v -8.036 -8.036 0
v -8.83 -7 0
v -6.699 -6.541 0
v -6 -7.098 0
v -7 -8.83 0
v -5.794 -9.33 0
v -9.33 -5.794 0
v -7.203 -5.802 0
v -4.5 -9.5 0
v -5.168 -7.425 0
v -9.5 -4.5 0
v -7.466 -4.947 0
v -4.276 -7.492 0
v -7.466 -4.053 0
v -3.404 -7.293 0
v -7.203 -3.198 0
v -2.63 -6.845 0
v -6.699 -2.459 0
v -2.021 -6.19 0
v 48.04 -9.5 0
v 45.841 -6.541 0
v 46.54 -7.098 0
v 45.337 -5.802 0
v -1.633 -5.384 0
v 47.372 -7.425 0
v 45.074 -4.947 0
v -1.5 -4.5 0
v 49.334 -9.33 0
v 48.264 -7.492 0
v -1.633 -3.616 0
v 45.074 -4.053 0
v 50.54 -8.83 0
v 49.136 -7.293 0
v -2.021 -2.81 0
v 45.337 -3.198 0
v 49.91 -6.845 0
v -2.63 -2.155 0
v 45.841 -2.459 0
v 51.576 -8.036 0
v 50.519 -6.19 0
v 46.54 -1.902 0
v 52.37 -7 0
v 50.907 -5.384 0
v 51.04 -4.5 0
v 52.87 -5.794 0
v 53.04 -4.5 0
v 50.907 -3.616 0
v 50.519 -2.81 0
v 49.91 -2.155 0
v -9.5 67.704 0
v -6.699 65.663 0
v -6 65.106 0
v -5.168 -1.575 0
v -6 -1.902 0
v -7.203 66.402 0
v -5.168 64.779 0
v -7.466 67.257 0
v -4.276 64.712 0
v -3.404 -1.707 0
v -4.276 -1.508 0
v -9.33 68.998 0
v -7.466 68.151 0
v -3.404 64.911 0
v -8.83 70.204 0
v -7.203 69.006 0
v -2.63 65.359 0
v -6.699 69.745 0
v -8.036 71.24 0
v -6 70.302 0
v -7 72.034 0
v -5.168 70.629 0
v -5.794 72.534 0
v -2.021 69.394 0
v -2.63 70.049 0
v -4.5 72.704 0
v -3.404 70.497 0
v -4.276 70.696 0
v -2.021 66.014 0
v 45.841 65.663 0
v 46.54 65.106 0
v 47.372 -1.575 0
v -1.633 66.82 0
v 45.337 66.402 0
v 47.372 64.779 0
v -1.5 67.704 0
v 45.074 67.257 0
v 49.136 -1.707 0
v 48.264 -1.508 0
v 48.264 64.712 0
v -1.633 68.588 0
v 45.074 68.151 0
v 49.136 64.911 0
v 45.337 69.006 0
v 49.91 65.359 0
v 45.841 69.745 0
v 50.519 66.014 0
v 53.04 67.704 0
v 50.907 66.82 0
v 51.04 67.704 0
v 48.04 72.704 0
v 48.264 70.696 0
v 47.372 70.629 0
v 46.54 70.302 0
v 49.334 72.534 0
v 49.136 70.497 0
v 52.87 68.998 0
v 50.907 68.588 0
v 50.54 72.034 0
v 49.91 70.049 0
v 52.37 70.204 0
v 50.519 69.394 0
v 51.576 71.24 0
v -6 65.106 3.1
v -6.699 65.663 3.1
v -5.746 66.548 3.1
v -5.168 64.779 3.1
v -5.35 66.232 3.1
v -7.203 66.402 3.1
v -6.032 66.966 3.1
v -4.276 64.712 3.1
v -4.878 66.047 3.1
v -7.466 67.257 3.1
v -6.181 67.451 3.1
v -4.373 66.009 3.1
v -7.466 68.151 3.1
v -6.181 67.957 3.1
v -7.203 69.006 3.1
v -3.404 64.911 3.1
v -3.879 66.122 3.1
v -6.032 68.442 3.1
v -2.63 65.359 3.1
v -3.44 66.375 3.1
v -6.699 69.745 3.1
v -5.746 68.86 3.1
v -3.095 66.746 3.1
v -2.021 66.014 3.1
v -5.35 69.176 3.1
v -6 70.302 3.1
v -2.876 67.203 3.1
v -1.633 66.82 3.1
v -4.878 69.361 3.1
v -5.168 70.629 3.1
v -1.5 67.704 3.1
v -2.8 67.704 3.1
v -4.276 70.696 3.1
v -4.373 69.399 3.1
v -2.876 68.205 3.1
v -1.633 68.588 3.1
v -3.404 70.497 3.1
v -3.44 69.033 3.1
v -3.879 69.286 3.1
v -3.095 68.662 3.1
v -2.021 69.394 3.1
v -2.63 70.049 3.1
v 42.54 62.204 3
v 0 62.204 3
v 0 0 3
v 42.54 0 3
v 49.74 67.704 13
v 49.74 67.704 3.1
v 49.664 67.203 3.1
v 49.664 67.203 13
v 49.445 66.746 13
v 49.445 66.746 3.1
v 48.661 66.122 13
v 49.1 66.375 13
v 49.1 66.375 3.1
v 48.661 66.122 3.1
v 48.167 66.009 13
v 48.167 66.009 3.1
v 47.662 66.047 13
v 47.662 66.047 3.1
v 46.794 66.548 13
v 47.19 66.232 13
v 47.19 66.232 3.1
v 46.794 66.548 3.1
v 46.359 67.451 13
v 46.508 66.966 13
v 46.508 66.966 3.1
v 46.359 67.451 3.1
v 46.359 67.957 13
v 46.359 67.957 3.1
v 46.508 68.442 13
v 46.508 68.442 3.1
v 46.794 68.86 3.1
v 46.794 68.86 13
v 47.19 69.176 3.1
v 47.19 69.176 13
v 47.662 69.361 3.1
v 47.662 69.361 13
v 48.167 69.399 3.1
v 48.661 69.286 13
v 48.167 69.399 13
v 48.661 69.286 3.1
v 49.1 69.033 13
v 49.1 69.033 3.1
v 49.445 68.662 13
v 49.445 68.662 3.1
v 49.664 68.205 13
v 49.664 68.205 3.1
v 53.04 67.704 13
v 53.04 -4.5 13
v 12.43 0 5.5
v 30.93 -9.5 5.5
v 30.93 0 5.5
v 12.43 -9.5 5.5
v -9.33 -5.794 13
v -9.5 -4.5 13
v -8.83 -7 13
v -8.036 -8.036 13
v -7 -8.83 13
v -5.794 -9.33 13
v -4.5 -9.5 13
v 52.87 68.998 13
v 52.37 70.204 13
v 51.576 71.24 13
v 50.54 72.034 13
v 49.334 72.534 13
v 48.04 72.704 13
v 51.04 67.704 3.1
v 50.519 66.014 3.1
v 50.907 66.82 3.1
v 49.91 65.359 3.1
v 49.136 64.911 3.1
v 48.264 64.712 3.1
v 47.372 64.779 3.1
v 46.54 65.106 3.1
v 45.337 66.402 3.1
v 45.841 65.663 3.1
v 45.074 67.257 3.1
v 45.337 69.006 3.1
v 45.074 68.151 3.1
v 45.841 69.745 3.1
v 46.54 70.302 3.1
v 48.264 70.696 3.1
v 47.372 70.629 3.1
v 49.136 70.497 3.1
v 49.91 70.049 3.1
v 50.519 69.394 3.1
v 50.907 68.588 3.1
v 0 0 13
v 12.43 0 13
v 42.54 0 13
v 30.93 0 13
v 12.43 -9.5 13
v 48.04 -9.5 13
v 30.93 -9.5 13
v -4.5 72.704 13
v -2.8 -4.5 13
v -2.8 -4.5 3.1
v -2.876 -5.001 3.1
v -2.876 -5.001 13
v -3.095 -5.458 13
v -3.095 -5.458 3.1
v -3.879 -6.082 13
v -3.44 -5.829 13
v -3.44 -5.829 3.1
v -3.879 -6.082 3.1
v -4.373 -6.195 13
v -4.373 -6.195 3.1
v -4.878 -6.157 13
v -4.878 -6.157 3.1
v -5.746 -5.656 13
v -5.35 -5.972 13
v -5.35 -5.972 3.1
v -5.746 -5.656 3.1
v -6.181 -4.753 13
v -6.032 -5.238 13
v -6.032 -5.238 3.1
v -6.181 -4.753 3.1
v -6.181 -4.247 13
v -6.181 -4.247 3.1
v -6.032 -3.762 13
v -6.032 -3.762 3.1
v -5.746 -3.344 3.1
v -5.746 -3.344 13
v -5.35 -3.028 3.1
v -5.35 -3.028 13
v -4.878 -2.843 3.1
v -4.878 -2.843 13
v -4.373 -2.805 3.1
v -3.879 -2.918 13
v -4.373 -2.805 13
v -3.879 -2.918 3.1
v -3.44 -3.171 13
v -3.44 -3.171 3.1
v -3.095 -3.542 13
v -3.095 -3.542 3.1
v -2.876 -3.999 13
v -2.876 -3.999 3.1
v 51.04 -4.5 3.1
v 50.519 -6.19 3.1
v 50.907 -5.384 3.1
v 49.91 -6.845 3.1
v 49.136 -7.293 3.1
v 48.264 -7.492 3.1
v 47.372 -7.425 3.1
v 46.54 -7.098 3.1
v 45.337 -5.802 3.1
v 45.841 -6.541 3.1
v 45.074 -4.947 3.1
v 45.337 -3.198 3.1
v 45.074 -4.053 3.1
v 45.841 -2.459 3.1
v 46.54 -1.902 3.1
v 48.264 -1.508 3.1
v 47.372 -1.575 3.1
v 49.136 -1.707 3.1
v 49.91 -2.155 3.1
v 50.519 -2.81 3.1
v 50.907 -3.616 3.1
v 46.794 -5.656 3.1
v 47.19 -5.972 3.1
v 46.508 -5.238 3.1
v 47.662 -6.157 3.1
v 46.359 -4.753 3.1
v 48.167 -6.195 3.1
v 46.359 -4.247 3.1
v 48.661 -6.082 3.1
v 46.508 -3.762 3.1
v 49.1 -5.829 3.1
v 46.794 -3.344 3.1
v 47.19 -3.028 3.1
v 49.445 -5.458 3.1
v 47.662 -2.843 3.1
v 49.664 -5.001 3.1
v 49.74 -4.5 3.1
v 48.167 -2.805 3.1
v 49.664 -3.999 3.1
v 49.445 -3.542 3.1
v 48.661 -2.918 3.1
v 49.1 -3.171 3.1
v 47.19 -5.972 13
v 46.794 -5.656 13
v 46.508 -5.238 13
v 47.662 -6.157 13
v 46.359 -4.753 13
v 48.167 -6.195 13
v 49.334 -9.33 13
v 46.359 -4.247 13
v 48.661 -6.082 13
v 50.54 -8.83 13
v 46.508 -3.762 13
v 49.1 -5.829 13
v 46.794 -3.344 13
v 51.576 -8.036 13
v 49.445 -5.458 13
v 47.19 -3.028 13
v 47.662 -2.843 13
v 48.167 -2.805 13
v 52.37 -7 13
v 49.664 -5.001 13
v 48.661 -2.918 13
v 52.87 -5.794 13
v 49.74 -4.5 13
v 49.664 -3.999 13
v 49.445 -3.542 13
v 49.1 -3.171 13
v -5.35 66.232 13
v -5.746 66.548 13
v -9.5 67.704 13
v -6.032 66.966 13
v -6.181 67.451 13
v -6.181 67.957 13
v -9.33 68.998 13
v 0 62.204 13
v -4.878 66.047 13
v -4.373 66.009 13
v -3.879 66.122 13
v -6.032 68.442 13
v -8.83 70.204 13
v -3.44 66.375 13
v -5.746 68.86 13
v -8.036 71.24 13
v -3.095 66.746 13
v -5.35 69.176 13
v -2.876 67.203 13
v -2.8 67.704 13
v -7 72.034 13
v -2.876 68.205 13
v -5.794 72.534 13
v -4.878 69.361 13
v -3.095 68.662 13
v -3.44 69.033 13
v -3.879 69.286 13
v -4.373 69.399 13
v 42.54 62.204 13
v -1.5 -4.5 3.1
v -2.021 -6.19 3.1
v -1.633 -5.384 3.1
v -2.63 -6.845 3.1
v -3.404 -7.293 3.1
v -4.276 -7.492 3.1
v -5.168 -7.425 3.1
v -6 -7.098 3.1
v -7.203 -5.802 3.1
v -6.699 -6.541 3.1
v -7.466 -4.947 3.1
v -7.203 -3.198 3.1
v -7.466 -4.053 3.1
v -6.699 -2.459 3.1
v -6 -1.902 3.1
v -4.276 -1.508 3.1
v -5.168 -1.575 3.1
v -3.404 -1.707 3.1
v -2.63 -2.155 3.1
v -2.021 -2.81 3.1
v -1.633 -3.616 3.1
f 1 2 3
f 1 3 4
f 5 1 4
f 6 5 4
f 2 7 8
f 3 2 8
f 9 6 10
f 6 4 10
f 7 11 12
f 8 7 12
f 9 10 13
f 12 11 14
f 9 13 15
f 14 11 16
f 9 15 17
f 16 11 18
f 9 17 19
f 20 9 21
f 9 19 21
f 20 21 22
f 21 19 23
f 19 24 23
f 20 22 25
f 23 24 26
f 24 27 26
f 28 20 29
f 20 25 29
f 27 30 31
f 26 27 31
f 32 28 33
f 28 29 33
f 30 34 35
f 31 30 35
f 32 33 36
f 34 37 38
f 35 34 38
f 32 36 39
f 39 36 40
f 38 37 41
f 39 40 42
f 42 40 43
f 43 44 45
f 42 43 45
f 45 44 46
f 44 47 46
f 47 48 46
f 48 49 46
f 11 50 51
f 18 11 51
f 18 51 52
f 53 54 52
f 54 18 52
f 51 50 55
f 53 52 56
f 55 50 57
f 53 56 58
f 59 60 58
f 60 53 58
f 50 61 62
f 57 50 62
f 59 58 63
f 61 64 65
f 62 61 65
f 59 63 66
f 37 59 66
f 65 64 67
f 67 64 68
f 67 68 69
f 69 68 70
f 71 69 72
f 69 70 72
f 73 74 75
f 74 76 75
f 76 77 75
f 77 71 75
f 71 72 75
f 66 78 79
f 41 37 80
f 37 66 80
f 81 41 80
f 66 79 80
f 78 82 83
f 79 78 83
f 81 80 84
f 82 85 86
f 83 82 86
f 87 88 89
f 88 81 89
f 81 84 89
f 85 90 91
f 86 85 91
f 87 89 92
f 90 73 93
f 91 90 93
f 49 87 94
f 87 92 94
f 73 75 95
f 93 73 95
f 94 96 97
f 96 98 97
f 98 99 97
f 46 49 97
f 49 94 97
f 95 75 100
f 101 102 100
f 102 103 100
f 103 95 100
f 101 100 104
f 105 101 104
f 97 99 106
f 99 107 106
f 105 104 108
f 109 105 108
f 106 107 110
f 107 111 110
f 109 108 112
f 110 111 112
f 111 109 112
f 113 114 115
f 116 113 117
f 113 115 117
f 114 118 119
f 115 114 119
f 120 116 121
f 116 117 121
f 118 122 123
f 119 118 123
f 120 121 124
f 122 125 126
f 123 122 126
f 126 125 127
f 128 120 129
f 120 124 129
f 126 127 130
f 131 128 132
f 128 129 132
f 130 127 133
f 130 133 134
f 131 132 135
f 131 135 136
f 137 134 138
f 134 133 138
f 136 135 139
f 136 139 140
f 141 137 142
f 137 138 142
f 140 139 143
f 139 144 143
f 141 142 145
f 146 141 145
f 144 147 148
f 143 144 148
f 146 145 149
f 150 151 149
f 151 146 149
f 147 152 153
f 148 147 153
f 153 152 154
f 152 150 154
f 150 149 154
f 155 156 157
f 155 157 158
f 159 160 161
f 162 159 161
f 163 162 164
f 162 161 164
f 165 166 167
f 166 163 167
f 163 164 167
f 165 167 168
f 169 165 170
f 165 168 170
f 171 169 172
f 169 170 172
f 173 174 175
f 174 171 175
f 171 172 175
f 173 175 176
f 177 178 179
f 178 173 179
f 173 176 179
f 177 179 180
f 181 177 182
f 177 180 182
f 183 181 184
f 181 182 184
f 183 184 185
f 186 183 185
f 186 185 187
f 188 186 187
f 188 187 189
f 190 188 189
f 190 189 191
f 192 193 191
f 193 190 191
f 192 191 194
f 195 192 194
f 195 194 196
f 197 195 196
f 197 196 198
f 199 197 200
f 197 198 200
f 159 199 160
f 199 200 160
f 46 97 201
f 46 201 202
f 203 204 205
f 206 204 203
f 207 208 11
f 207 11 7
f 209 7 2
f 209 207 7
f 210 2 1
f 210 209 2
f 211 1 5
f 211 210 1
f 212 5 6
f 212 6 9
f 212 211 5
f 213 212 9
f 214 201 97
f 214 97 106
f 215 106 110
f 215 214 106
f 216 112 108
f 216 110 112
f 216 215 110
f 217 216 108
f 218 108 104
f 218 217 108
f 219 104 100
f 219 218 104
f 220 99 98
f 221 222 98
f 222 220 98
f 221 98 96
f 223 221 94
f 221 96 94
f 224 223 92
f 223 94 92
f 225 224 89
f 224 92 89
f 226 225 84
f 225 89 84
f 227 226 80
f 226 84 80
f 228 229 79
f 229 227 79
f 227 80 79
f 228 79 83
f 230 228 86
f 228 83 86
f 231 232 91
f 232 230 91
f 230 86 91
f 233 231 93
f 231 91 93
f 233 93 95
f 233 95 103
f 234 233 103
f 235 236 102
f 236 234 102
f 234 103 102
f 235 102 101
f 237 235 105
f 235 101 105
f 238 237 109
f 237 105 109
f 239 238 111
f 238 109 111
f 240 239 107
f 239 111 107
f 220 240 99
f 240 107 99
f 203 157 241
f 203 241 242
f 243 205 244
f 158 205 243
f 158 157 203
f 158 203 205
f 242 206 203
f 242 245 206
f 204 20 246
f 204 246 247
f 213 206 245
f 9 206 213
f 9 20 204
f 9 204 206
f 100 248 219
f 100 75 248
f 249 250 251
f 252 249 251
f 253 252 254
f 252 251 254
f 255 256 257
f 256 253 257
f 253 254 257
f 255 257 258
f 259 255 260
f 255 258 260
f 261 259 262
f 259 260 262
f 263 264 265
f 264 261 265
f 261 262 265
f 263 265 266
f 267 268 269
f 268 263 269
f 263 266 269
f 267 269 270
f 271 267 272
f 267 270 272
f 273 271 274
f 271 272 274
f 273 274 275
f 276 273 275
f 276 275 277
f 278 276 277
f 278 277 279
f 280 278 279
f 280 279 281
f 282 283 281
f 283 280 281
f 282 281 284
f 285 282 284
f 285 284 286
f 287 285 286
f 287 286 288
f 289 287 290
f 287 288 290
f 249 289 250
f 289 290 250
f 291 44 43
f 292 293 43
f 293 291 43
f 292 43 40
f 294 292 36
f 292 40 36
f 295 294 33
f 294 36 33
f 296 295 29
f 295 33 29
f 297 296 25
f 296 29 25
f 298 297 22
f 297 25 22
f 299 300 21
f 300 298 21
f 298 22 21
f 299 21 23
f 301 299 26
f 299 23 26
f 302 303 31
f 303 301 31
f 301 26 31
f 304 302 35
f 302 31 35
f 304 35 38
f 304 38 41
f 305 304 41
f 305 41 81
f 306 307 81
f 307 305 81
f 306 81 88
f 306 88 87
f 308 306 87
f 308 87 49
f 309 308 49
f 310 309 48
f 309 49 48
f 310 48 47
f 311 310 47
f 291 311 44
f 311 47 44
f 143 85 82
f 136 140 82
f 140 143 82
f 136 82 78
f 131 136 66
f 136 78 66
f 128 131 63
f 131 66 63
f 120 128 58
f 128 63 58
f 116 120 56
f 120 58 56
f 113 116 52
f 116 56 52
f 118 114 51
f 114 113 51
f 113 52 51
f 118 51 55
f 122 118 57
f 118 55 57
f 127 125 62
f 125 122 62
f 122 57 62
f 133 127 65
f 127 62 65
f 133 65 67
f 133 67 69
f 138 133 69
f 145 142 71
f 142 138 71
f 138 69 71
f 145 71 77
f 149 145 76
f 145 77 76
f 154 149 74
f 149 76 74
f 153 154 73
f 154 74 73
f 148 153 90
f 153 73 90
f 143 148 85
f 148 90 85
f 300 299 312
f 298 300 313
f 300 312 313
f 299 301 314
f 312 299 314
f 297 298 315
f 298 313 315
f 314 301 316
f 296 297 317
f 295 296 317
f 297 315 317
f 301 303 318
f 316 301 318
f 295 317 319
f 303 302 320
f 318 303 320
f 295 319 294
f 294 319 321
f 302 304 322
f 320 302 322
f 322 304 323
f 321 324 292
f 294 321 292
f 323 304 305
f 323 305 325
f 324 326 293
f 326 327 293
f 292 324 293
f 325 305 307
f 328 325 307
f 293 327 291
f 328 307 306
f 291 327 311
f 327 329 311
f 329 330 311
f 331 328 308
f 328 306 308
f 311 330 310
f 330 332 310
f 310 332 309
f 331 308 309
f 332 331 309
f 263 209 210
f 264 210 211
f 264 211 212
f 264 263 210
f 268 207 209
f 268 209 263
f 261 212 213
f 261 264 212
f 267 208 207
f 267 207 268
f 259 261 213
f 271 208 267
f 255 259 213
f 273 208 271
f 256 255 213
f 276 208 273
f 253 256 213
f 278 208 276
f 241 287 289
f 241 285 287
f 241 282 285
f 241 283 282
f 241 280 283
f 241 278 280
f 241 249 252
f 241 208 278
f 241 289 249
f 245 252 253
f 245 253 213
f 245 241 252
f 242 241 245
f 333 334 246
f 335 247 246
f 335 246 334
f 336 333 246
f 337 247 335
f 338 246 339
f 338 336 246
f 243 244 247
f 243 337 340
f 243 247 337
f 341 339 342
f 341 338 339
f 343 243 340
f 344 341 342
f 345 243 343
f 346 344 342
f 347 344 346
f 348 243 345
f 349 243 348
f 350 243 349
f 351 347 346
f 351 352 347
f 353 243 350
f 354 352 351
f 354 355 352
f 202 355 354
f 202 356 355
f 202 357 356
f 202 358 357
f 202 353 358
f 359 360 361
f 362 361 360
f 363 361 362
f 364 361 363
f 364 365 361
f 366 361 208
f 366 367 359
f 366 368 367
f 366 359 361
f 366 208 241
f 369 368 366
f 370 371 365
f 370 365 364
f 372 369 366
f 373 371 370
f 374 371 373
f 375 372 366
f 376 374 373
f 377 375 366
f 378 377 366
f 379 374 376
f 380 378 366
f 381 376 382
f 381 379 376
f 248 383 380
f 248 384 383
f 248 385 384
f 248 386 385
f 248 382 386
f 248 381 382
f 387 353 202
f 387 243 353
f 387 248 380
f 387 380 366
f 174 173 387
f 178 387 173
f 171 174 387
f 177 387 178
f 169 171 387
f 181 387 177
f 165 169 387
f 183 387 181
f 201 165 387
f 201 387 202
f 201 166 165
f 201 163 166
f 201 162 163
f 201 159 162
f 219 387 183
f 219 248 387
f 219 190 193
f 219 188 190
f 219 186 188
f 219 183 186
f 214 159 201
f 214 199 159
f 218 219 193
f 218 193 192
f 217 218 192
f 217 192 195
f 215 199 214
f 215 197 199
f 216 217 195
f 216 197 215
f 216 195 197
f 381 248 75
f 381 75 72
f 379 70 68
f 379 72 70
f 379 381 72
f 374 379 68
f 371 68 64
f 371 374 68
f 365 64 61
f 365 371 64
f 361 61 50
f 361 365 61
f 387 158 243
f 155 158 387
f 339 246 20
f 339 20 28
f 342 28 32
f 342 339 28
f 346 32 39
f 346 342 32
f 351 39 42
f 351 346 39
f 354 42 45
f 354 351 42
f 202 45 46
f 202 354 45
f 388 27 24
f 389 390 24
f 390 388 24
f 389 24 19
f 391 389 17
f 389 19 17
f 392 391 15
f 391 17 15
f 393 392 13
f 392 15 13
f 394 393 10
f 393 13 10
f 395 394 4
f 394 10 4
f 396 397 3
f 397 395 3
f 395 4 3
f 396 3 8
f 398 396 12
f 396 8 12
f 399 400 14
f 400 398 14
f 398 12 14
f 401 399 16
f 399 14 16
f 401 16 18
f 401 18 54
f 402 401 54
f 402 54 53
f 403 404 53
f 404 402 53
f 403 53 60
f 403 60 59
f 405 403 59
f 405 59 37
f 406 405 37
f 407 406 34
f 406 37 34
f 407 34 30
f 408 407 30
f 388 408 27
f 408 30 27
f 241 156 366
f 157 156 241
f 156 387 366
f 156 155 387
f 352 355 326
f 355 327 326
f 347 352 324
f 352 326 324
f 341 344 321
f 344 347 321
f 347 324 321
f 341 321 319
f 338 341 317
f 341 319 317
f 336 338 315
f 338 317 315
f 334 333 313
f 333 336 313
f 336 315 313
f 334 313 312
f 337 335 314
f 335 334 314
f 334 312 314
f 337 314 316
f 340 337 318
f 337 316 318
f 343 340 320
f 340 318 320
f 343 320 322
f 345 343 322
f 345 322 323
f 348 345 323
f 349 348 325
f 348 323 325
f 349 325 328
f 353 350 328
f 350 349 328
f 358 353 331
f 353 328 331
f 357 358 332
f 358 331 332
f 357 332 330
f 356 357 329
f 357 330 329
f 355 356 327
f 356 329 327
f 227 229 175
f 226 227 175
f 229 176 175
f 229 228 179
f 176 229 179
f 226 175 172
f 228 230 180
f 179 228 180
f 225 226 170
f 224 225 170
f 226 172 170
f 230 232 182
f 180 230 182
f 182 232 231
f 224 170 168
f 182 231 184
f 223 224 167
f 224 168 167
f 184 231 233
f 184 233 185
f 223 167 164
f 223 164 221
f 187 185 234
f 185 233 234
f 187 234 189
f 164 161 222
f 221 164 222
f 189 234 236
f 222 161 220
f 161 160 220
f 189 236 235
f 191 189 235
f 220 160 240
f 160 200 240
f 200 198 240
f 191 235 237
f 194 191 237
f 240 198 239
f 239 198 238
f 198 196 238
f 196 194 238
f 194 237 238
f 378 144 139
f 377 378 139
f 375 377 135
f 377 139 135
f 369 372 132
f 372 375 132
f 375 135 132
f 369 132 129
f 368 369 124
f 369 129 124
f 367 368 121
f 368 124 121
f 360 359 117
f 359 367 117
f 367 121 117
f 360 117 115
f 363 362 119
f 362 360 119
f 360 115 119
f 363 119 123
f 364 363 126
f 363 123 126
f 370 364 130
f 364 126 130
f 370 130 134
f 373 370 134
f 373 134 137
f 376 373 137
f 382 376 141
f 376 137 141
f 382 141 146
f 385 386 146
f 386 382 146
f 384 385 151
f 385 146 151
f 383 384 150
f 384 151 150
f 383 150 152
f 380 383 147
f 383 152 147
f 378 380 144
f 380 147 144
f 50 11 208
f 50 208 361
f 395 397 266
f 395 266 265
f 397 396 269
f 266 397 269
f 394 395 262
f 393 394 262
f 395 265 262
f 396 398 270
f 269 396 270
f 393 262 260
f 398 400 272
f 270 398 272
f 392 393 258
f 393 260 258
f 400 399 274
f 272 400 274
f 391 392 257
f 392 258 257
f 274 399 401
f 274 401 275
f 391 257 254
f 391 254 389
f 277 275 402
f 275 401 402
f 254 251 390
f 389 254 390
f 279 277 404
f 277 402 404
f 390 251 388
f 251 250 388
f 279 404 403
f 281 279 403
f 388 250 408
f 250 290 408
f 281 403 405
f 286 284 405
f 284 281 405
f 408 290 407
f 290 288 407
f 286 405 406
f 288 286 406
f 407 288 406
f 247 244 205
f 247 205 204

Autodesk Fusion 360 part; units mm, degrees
sketch "Sketch1" plane through (0, 0, 0) normal (0, 0, 1) x (1, 0, 0) in component "Some Fidget Keyboard"
  line L0 (0, 0) -> (42.54, 0)
  line L1 (42.54, 0) -> (42.54, 62.204)
  line L2 (42.54, 62.204) -> (0, 62.204)
  line L3 (0, 62.204) -> (0, 0)
  line L4 (-9.5, 72.704) -> (53.04, 72.704)
  line L5 (53.04, 72.704) -> (53.04, -9.5)
  line L6 (53.04, -9.5) -> (-9.5, -9.5)
  line L7 (-9.5, -9.5) -> (-9.5, 72.704)
  circle A0 centre (-4.5, 67.704) radius 1.7
  circle A1 centre (48.04, 67.704) radius 1.7
  circle A2 centre (48.04, -4.5) radius 1.7
  circle A3 centre (-4.5, -4.5) radius 1.7
  circle A4 centre (-4.5, 67.704) radius 3
  circle A5 centre (48.04, 67.704) radius 3
  circle A6 centre (48.04, -4.5) radius 3
  circle A7 centre (-4.5, -4.5) radius 3
  dimension "d4" = 42.54
  dimension "d5" = 62.204
  dimension "d6" = 62.54
  dimension "d7" = 82.204
  dimension "d8" = 9.5
  dimension "d9" = 9.5
  dimension "d10" = 3.4
  dimension "d11" = 3.4
  dimension "d12" = 3.4
  dimension "d13" = 3.4
  dimension "d14" = 5
  dimension "d15" = 5
  dimension "d16" = 5
  dimension "d17" = 5
  dimension "d18" = 5
  dimension "d20" = 5
  dimension "d21" = 5
  dimension "d22" = 5
  dimension "d23" = 6
  dimension "d24" = 6
  dimension "d25" = 6
  dimension "d26" = 6
extrude "Extrude1" add sketch "Sketch1" along normal blind 9.9 from surface at 3.1 contours A4 | A5 | A6 | A7 makes body 1 at (45.4801, 66.1397, 9.7) makes body 2 at (-7.0599, 66.1397, 9.7) makes body 3 at (51.0363, -4.6495, 9.7) makes body 4 at (-1.5037, -4.6495, 9.7) in component "Some Fidget Keyboard"
extrude "Extrude2" add sketch "Sketch1" along normal blind 13 contours L4 L5 L6 L7 bodies 1 2 3 4 in component "Some Fidget Keyboard"
extrude "Extrude3" add sketch "Sketch1" along normal blind 3 contours L0 L1 L2 L3 bodies 1 in component "Some Fidget Keyboard"
sketch "Sketch2" plane through (0, 0, 0) normal (0, 0, 1) x (1, 0, 0) in component "Some Fidget Keyboard"
sketch "Sketch3" plane through (0, 0, 13) normal (0, 0, 1) x (-1, 0, 0) in component "Some Fidget Keyboard"
  circle A0 centre (-48.04, -67.704) radius 1.7
  circle A1 centre (4.5, 4.5) radius 1.7
  line L0 (0, 0) -> (0, -62.204)
  line L1 (0, -62.204) -> (-42.54, -62.204)
  line L2 (-42.54, -62.204) -> (-42.54, 0)
  line L3 (-42.54, 0) -> (0, 0)
  line L4 (9.5, 9.5) -> (-53.04, 9.5)
  line L5 (-53.04, 9.5) -> (-53.04, -72.704)
  line L6 (-53.04, -72.704) -> (9.5, -72.704)
  line L7 (9.5, -72.704) -> (9.5, 9.5)
  circle A2 centre (4.5, -67.704) radius 1.7
  circle A3 centre (-48.04, 4.5) radius 1.7
  line L8 (-30.93, 9.5) -> (-12.43, 9.5)
  line L9 (-12.43, 9.5) -> (-12.43, 0)
  line L10 (-12.43, 0) -> (-30.93, 0)
  line L11 (-30.93, 0) -> (-30.93, 9.5)
  line L12 (-53.04, -72.704) -> (-53.04, 9.5)
  dimension "d36" = 18.5
  dimension "d37" = 22.11
extrude "Extrude4" cut sketch "Sketch3" against normal blind 7.5 contours L3 L4 L8 L9 L10 L11 bodies 1 in component "Some Fidget Keyboard"
fillet "Fillet1" radius 5 1 edges at (-9.5, -9.5, 6.5) on bodies 1 in component "Some Fidget Keyboard"
fillet "Fillet2" radius 5 1 edges at (-9.5, 72.704, 6.5) on bodies 1 in component "Some Fidget Keyboard"
fillet "Fillet3" radius 5 2 edges at (53.04, 72.704, 6.5) (53.04, -9.5, 6.5) on bodies 1 in component "Some Fidget Keyboard"
sketch "Sketch1 (2)" plane through (0, 0, 0) normal (0, 0, 1) x (1, 0, 0)
sketch "Sketch2 (2)" plane through (0, 0, 3) normal (0, 0, 1) x (-1, 0, 0)
  line L0 (0, -62.204) -> (0, 0)
  line L1 (0, 0) -> (-42.54, 0)
  line L2 (-42.54, 0) -> (-42.54, -62.204)
  line L3 (-42.54, -62.204) -> (0, -62.204)
component "Some Fidget Keyboard" placed x (1, 0, 0) y (0, 1, 0) z (0, 0, 1) at (0, 0, 0)
